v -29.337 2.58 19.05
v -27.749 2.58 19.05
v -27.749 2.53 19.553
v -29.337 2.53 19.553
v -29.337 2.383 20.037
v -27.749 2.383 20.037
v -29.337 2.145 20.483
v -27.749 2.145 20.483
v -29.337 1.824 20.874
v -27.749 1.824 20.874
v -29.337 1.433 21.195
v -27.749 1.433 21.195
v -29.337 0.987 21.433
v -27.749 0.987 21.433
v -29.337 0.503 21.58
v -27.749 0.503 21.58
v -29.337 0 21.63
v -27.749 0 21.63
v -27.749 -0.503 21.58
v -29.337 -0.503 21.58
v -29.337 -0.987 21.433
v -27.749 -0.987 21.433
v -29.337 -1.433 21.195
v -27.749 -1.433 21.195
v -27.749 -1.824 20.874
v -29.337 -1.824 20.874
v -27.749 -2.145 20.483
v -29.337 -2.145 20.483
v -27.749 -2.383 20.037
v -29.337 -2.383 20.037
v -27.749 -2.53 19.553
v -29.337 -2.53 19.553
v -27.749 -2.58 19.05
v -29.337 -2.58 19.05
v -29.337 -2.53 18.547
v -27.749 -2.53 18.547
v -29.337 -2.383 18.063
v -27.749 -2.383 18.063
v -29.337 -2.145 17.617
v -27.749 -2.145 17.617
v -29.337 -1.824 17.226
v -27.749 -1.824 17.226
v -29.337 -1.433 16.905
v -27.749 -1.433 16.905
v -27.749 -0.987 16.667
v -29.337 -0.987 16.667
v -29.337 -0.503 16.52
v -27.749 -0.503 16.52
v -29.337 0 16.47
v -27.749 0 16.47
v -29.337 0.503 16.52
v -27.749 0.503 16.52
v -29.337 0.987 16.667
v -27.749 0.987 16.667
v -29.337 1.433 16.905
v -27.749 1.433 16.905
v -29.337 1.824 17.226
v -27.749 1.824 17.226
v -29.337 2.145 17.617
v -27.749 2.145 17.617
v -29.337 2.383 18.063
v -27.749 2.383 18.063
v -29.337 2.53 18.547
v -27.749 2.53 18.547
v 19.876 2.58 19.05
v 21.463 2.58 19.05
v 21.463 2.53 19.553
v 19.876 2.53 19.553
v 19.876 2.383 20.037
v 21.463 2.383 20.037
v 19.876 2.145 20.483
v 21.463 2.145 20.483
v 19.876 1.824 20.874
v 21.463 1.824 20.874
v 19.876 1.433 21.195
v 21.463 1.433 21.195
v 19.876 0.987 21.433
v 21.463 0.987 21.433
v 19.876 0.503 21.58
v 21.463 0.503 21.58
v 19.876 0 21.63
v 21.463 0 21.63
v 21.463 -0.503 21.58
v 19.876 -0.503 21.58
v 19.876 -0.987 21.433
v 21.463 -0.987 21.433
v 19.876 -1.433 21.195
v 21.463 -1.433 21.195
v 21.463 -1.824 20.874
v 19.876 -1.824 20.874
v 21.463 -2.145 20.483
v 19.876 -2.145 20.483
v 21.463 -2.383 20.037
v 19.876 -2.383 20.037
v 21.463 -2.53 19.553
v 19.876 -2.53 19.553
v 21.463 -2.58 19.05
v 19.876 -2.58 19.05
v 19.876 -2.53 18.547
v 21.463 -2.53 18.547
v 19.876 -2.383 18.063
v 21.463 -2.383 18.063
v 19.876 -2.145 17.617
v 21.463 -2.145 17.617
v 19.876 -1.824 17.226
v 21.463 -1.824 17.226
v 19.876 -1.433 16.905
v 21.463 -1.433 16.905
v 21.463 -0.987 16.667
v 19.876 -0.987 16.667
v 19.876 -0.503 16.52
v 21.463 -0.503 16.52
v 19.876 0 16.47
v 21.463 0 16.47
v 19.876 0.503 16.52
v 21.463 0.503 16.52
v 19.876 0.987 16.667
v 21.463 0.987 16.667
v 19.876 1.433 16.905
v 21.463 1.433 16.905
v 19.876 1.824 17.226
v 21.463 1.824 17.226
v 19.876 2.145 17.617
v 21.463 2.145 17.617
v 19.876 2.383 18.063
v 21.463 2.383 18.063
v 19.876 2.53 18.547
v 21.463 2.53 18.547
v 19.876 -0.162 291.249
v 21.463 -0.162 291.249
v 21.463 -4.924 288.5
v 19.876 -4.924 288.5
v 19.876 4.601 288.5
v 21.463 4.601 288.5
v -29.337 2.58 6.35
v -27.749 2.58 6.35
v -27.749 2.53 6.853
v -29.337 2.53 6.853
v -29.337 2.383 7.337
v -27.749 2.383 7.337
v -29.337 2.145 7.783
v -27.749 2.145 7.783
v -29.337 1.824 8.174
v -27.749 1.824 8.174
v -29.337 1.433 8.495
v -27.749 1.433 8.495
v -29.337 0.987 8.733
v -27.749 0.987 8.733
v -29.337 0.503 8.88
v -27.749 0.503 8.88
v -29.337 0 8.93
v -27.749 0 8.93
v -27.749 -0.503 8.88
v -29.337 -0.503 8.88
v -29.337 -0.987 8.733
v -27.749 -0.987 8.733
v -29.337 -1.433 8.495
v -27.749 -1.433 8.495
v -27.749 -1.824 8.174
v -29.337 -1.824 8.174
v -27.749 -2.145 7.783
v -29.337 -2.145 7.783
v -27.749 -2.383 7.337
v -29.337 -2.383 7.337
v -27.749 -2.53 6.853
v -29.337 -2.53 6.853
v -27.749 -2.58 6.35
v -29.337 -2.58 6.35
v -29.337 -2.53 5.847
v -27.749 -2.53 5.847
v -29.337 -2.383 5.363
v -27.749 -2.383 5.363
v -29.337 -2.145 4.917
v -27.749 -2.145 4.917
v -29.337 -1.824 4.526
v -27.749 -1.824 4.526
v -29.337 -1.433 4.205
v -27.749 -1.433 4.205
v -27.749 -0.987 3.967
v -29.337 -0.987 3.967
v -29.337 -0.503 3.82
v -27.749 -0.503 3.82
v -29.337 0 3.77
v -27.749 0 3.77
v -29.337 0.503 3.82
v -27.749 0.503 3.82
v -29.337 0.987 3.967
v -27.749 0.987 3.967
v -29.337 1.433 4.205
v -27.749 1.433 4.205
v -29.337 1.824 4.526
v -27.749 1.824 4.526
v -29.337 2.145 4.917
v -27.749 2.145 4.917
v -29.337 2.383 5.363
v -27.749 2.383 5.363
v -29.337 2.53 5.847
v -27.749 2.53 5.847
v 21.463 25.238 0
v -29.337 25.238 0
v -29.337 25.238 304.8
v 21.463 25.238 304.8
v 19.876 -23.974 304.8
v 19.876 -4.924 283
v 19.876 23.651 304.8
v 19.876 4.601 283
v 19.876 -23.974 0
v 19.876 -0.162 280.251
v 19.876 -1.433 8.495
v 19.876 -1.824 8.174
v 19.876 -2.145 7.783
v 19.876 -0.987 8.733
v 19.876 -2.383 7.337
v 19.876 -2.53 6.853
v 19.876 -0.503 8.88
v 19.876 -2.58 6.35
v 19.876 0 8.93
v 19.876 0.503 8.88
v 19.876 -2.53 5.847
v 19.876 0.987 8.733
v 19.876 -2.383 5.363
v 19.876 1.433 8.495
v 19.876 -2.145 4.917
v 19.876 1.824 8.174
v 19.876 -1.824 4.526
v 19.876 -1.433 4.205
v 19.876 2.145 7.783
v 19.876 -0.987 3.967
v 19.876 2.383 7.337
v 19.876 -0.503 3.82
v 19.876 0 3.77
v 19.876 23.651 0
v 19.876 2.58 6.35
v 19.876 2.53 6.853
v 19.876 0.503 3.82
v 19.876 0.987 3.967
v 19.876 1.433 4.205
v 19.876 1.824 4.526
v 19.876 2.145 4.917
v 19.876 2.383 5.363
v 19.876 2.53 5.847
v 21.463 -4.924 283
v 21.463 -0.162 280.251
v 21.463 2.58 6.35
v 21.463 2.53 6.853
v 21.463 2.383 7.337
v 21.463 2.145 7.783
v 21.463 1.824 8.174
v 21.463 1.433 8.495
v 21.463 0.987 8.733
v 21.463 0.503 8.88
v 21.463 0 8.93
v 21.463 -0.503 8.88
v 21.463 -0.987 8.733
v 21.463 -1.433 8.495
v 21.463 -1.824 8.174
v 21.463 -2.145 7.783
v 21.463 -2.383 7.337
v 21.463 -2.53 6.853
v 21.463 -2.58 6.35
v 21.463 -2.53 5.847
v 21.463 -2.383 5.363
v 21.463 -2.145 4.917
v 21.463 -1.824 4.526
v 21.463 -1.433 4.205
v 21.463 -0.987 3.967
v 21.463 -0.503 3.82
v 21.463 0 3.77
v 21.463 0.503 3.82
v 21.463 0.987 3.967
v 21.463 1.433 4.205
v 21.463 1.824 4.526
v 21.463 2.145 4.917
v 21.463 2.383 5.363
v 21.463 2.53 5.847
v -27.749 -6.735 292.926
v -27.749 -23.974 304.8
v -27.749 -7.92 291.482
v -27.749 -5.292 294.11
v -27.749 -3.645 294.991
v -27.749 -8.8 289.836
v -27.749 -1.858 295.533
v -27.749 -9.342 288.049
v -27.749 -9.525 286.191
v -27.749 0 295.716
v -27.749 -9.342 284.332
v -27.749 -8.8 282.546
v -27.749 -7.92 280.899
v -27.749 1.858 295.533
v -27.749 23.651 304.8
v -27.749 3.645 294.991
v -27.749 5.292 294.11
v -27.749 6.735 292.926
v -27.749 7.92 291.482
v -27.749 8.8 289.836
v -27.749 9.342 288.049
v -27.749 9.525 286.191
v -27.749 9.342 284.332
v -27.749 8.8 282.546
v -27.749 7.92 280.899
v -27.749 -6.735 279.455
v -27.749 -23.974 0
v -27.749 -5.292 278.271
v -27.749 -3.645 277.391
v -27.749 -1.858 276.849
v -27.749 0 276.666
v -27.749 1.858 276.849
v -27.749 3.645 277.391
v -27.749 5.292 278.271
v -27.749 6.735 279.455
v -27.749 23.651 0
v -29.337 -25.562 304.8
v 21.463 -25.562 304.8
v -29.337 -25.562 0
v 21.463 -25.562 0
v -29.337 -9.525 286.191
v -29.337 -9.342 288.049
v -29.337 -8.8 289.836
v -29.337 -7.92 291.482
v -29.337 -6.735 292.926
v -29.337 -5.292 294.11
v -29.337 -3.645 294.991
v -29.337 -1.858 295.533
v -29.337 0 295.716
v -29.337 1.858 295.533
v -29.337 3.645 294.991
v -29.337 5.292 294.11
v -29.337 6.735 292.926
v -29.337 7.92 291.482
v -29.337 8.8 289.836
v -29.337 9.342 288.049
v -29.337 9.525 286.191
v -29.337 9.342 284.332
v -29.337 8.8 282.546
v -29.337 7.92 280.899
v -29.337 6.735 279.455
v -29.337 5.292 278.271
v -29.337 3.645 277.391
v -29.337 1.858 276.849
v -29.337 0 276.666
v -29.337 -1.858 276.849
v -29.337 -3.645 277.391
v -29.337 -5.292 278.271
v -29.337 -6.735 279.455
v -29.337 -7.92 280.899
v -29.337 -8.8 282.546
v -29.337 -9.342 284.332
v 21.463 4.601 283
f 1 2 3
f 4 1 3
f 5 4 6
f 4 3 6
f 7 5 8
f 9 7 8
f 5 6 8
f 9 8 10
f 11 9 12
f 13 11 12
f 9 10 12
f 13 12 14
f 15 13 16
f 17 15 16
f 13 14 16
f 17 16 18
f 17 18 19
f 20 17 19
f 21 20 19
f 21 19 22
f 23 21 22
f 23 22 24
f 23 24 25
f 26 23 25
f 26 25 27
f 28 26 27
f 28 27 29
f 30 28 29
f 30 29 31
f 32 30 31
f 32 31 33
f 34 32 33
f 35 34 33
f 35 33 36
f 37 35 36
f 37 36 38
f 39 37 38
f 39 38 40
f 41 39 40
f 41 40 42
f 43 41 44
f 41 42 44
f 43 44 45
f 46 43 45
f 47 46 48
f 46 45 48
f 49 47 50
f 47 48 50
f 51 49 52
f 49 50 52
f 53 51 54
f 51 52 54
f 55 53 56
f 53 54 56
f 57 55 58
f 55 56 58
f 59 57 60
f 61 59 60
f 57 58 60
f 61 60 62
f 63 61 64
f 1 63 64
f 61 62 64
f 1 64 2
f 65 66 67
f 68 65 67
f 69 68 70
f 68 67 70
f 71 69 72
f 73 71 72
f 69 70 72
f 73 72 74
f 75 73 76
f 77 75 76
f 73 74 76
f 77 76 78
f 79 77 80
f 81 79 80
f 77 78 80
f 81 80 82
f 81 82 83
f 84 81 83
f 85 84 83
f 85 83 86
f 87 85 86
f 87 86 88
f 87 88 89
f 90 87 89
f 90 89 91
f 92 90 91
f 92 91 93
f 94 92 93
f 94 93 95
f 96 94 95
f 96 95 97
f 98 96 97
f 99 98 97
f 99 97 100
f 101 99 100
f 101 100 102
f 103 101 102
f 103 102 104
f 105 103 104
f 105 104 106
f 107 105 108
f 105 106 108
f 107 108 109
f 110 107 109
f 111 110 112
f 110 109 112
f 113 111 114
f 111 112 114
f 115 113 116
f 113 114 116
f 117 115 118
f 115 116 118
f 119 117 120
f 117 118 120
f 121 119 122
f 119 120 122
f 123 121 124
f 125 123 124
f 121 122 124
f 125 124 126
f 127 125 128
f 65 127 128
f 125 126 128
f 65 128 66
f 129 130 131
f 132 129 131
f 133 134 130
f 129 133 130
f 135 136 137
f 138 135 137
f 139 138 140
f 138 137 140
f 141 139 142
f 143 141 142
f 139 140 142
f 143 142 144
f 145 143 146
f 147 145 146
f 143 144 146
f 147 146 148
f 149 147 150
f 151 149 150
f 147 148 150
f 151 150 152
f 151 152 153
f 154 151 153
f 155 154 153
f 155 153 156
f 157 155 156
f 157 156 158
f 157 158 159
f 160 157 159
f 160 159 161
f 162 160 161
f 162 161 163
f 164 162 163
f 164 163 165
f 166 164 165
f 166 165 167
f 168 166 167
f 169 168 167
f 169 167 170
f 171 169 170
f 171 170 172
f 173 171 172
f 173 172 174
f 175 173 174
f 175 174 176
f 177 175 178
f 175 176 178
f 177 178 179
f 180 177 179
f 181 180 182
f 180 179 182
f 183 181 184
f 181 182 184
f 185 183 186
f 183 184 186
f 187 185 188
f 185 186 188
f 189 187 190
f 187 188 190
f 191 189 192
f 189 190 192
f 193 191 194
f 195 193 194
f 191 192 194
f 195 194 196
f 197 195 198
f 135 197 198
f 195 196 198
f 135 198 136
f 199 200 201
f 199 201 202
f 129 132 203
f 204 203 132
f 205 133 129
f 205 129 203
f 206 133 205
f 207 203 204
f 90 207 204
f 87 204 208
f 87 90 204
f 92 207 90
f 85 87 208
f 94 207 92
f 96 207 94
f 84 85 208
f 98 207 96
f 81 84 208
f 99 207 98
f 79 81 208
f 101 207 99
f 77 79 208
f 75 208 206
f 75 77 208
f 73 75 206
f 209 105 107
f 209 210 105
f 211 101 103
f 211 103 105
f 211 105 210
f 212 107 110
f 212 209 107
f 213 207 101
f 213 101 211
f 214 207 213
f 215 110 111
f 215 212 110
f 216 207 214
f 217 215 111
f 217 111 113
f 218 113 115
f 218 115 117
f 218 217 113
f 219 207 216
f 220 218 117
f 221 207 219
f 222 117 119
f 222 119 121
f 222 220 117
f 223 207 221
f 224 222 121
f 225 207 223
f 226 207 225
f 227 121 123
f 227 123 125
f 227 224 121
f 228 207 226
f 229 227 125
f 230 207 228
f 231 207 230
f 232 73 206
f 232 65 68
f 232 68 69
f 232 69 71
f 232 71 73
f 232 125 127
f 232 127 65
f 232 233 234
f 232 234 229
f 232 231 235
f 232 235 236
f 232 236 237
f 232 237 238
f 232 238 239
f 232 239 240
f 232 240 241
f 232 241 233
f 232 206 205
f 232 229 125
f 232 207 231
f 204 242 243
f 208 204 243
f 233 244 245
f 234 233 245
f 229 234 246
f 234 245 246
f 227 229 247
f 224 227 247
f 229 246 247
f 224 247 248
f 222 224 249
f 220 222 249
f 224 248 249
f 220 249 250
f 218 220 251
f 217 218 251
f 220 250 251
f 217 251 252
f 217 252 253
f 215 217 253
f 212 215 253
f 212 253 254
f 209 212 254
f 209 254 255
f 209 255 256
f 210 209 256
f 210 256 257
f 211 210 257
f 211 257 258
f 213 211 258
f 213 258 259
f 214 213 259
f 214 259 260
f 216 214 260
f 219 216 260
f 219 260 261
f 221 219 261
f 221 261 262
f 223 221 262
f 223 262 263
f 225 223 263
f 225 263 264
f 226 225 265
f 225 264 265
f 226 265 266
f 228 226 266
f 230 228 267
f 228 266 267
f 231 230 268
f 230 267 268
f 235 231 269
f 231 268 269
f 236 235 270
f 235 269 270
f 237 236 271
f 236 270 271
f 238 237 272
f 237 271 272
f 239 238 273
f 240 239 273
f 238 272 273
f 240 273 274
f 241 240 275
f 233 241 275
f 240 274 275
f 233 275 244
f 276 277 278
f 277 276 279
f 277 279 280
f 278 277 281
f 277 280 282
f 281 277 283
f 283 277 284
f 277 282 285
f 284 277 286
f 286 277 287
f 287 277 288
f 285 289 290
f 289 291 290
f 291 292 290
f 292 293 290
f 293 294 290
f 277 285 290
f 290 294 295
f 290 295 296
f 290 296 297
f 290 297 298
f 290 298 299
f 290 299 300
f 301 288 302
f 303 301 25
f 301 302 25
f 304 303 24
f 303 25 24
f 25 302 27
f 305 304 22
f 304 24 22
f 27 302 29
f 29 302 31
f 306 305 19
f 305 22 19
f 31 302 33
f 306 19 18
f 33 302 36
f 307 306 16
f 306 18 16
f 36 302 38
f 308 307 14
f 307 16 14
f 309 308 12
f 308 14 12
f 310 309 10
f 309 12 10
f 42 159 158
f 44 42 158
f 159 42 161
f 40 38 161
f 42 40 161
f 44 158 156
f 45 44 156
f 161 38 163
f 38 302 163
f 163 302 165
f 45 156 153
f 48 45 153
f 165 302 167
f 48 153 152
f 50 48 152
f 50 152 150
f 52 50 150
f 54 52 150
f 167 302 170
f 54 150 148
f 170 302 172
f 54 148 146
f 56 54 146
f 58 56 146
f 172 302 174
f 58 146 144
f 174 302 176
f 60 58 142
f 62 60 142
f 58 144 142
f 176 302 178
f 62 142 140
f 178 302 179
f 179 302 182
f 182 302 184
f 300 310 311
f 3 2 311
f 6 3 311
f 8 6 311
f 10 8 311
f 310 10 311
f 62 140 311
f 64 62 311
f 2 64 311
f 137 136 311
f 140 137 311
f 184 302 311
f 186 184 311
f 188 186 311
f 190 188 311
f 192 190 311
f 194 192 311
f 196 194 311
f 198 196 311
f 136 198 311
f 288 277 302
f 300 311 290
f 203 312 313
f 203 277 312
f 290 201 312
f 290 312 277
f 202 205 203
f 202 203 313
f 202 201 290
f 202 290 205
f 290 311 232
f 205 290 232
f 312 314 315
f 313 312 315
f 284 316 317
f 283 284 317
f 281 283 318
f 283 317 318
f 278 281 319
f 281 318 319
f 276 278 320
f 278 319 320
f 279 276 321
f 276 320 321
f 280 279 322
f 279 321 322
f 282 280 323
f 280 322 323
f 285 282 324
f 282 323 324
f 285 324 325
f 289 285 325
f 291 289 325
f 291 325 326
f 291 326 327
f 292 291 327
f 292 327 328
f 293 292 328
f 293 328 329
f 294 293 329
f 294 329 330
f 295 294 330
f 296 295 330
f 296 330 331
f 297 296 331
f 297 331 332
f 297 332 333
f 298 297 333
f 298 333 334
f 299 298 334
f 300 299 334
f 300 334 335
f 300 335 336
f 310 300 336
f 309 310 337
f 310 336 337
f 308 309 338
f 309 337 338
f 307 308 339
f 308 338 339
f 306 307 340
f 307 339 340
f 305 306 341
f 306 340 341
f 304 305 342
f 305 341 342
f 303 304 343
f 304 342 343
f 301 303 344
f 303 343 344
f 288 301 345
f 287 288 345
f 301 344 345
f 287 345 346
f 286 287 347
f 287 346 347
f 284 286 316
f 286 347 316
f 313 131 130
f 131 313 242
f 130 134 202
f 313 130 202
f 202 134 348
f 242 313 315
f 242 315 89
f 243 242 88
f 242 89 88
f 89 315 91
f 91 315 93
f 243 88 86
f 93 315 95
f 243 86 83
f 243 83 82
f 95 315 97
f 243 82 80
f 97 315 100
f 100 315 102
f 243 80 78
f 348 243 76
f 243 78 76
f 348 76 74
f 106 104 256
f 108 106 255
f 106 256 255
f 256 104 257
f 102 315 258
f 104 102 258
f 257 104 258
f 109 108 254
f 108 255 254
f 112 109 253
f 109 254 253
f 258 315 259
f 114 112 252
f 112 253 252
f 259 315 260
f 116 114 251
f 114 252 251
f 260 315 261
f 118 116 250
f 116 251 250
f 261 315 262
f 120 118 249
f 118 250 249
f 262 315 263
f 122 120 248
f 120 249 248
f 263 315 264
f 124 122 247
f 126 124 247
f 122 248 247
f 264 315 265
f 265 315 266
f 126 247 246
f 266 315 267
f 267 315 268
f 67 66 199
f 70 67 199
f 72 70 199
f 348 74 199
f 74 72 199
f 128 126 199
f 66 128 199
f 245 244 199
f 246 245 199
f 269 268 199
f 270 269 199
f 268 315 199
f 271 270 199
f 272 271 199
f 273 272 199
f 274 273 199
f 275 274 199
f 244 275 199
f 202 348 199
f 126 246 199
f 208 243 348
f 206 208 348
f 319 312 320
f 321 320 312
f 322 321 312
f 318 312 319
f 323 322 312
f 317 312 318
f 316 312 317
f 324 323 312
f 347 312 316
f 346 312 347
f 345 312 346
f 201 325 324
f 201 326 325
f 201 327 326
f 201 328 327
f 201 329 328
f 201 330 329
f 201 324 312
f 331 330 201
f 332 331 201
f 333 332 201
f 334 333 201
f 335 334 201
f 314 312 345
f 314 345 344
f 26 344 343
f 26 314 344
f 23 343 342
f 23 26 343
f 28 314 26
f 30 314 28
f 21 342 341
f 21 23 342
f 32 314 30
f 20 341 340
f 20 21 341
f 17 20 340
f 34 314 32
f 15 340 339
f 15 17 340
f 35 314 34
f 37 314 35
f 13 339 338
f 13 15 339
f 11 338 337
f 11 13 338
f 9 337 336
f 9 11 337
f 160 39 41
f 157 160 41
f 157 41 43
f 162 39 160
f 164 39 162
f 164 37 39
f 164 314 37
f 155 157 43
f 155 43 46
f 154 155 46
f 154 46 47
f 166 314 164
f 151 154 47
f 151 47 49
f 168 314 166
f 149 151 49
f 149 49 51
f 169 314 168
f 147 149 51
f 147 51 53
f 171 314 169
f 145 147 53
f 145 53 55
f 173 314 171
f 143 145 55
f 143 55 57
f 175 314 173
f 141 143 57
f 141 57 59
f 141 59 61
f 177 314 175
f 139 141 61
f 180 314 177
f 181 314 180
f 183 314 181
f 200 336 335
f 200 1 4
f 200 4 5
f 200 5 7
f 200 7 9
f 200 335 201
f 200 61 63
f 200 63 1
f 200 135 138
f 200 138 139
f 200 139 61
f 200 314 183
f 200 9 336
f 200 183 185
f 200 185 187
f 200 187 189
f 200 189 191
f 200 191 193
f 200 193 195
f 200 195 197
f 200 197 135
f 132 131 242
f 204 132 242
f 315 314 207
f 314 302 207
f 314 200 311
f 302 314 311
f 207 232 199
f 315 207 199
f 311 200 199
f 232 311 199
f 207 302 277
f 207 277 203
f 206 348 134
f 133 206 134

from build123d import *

# Parameters (mm, degrees)
SKETCH1_W           = 50.8
SKETCH1_H           = 50.8
SKETCH1_W_2         = 47.625
SKETCH1_H_2         = 47.625
BOSS_EXTRUDE1_DEPTH = 304.8
CUT_EXTRUDE1_DEPTH  = 304.8
SKETCH3_R           = 2.5796875
CUT_EXTRUDE2_DEPTH  = 159
SKETCH4_R           = 9.525
CUT_EXTRUDE3_DEPTH  = 3.175


with BuildPart() as part:
    # Sketch1 → Boss-Extrude1 (new body)
    with BuildSketch(Plane.XY):
        with Locations((-3.936730361, -0.161783439)):
            Rectangle(SKETCH1_W, SKETCH1_H)
        with Locations((-3.936730361, -0.161783439)):
            Rectangle(SKETCH1_W_2, SKETCH1_H_2, mode=Mode.SUBTRACT)
    extrude(amount=BOSS_EXTRUDE1_DEPTH)

    # Sketch2 → Cut-Extrude1 (cut)
    with BuildSketch(Plane(origin=(21.463269639, 0, 0), x_dir=(0, 0, -1), z_dir=(1, 0, 0))):
        Polygon((-280.250738686, -0.161783439), (-283.000369343, 4.600716561), (-288.499630657, 4.600716561), (-291.249261314, -0.161783439), (-288.499630657, -4.924283439), (-283.000369343, -4.924283439), align=None)
    extrude(amount=-CUT_EXTRUDE1_DEPTH, mode=Mode.SUBTRACT)

    # Sketch3 → Cut-Extrude2 (cut)
    with BuildSketch(Plane(origin=(21.463269639, 0, 0), x_dir=(0, 0, -1), z_dir=(1, 0, 0))):
        with Locations(Location((-6.35, 0, 0), (0, 0, 90))):
            Circle(SKETCH3_R)
        with Locations(Location((-19.05, 0, 0), (0, 0, 90))):
            Circle(SKETCH3_R)
    extrude(amount=-CUT_EXTRUDE2_DEPTH, mode=Mode.SUBTRACT)

    # Sketch4 → Cut-Extrude3 (cut)
    with BuildSketch(Plane.ZY.offset(29.336730361)):
        with Locations(Location((286.190661961, 0, 0), (0, 0, 270))):
            Circle(SKETCH4_R)
    extrude(amount=-CUT_EXTRUDE3_DEPTH, mode=Mode.SUBTRACT)


solid = part.part
